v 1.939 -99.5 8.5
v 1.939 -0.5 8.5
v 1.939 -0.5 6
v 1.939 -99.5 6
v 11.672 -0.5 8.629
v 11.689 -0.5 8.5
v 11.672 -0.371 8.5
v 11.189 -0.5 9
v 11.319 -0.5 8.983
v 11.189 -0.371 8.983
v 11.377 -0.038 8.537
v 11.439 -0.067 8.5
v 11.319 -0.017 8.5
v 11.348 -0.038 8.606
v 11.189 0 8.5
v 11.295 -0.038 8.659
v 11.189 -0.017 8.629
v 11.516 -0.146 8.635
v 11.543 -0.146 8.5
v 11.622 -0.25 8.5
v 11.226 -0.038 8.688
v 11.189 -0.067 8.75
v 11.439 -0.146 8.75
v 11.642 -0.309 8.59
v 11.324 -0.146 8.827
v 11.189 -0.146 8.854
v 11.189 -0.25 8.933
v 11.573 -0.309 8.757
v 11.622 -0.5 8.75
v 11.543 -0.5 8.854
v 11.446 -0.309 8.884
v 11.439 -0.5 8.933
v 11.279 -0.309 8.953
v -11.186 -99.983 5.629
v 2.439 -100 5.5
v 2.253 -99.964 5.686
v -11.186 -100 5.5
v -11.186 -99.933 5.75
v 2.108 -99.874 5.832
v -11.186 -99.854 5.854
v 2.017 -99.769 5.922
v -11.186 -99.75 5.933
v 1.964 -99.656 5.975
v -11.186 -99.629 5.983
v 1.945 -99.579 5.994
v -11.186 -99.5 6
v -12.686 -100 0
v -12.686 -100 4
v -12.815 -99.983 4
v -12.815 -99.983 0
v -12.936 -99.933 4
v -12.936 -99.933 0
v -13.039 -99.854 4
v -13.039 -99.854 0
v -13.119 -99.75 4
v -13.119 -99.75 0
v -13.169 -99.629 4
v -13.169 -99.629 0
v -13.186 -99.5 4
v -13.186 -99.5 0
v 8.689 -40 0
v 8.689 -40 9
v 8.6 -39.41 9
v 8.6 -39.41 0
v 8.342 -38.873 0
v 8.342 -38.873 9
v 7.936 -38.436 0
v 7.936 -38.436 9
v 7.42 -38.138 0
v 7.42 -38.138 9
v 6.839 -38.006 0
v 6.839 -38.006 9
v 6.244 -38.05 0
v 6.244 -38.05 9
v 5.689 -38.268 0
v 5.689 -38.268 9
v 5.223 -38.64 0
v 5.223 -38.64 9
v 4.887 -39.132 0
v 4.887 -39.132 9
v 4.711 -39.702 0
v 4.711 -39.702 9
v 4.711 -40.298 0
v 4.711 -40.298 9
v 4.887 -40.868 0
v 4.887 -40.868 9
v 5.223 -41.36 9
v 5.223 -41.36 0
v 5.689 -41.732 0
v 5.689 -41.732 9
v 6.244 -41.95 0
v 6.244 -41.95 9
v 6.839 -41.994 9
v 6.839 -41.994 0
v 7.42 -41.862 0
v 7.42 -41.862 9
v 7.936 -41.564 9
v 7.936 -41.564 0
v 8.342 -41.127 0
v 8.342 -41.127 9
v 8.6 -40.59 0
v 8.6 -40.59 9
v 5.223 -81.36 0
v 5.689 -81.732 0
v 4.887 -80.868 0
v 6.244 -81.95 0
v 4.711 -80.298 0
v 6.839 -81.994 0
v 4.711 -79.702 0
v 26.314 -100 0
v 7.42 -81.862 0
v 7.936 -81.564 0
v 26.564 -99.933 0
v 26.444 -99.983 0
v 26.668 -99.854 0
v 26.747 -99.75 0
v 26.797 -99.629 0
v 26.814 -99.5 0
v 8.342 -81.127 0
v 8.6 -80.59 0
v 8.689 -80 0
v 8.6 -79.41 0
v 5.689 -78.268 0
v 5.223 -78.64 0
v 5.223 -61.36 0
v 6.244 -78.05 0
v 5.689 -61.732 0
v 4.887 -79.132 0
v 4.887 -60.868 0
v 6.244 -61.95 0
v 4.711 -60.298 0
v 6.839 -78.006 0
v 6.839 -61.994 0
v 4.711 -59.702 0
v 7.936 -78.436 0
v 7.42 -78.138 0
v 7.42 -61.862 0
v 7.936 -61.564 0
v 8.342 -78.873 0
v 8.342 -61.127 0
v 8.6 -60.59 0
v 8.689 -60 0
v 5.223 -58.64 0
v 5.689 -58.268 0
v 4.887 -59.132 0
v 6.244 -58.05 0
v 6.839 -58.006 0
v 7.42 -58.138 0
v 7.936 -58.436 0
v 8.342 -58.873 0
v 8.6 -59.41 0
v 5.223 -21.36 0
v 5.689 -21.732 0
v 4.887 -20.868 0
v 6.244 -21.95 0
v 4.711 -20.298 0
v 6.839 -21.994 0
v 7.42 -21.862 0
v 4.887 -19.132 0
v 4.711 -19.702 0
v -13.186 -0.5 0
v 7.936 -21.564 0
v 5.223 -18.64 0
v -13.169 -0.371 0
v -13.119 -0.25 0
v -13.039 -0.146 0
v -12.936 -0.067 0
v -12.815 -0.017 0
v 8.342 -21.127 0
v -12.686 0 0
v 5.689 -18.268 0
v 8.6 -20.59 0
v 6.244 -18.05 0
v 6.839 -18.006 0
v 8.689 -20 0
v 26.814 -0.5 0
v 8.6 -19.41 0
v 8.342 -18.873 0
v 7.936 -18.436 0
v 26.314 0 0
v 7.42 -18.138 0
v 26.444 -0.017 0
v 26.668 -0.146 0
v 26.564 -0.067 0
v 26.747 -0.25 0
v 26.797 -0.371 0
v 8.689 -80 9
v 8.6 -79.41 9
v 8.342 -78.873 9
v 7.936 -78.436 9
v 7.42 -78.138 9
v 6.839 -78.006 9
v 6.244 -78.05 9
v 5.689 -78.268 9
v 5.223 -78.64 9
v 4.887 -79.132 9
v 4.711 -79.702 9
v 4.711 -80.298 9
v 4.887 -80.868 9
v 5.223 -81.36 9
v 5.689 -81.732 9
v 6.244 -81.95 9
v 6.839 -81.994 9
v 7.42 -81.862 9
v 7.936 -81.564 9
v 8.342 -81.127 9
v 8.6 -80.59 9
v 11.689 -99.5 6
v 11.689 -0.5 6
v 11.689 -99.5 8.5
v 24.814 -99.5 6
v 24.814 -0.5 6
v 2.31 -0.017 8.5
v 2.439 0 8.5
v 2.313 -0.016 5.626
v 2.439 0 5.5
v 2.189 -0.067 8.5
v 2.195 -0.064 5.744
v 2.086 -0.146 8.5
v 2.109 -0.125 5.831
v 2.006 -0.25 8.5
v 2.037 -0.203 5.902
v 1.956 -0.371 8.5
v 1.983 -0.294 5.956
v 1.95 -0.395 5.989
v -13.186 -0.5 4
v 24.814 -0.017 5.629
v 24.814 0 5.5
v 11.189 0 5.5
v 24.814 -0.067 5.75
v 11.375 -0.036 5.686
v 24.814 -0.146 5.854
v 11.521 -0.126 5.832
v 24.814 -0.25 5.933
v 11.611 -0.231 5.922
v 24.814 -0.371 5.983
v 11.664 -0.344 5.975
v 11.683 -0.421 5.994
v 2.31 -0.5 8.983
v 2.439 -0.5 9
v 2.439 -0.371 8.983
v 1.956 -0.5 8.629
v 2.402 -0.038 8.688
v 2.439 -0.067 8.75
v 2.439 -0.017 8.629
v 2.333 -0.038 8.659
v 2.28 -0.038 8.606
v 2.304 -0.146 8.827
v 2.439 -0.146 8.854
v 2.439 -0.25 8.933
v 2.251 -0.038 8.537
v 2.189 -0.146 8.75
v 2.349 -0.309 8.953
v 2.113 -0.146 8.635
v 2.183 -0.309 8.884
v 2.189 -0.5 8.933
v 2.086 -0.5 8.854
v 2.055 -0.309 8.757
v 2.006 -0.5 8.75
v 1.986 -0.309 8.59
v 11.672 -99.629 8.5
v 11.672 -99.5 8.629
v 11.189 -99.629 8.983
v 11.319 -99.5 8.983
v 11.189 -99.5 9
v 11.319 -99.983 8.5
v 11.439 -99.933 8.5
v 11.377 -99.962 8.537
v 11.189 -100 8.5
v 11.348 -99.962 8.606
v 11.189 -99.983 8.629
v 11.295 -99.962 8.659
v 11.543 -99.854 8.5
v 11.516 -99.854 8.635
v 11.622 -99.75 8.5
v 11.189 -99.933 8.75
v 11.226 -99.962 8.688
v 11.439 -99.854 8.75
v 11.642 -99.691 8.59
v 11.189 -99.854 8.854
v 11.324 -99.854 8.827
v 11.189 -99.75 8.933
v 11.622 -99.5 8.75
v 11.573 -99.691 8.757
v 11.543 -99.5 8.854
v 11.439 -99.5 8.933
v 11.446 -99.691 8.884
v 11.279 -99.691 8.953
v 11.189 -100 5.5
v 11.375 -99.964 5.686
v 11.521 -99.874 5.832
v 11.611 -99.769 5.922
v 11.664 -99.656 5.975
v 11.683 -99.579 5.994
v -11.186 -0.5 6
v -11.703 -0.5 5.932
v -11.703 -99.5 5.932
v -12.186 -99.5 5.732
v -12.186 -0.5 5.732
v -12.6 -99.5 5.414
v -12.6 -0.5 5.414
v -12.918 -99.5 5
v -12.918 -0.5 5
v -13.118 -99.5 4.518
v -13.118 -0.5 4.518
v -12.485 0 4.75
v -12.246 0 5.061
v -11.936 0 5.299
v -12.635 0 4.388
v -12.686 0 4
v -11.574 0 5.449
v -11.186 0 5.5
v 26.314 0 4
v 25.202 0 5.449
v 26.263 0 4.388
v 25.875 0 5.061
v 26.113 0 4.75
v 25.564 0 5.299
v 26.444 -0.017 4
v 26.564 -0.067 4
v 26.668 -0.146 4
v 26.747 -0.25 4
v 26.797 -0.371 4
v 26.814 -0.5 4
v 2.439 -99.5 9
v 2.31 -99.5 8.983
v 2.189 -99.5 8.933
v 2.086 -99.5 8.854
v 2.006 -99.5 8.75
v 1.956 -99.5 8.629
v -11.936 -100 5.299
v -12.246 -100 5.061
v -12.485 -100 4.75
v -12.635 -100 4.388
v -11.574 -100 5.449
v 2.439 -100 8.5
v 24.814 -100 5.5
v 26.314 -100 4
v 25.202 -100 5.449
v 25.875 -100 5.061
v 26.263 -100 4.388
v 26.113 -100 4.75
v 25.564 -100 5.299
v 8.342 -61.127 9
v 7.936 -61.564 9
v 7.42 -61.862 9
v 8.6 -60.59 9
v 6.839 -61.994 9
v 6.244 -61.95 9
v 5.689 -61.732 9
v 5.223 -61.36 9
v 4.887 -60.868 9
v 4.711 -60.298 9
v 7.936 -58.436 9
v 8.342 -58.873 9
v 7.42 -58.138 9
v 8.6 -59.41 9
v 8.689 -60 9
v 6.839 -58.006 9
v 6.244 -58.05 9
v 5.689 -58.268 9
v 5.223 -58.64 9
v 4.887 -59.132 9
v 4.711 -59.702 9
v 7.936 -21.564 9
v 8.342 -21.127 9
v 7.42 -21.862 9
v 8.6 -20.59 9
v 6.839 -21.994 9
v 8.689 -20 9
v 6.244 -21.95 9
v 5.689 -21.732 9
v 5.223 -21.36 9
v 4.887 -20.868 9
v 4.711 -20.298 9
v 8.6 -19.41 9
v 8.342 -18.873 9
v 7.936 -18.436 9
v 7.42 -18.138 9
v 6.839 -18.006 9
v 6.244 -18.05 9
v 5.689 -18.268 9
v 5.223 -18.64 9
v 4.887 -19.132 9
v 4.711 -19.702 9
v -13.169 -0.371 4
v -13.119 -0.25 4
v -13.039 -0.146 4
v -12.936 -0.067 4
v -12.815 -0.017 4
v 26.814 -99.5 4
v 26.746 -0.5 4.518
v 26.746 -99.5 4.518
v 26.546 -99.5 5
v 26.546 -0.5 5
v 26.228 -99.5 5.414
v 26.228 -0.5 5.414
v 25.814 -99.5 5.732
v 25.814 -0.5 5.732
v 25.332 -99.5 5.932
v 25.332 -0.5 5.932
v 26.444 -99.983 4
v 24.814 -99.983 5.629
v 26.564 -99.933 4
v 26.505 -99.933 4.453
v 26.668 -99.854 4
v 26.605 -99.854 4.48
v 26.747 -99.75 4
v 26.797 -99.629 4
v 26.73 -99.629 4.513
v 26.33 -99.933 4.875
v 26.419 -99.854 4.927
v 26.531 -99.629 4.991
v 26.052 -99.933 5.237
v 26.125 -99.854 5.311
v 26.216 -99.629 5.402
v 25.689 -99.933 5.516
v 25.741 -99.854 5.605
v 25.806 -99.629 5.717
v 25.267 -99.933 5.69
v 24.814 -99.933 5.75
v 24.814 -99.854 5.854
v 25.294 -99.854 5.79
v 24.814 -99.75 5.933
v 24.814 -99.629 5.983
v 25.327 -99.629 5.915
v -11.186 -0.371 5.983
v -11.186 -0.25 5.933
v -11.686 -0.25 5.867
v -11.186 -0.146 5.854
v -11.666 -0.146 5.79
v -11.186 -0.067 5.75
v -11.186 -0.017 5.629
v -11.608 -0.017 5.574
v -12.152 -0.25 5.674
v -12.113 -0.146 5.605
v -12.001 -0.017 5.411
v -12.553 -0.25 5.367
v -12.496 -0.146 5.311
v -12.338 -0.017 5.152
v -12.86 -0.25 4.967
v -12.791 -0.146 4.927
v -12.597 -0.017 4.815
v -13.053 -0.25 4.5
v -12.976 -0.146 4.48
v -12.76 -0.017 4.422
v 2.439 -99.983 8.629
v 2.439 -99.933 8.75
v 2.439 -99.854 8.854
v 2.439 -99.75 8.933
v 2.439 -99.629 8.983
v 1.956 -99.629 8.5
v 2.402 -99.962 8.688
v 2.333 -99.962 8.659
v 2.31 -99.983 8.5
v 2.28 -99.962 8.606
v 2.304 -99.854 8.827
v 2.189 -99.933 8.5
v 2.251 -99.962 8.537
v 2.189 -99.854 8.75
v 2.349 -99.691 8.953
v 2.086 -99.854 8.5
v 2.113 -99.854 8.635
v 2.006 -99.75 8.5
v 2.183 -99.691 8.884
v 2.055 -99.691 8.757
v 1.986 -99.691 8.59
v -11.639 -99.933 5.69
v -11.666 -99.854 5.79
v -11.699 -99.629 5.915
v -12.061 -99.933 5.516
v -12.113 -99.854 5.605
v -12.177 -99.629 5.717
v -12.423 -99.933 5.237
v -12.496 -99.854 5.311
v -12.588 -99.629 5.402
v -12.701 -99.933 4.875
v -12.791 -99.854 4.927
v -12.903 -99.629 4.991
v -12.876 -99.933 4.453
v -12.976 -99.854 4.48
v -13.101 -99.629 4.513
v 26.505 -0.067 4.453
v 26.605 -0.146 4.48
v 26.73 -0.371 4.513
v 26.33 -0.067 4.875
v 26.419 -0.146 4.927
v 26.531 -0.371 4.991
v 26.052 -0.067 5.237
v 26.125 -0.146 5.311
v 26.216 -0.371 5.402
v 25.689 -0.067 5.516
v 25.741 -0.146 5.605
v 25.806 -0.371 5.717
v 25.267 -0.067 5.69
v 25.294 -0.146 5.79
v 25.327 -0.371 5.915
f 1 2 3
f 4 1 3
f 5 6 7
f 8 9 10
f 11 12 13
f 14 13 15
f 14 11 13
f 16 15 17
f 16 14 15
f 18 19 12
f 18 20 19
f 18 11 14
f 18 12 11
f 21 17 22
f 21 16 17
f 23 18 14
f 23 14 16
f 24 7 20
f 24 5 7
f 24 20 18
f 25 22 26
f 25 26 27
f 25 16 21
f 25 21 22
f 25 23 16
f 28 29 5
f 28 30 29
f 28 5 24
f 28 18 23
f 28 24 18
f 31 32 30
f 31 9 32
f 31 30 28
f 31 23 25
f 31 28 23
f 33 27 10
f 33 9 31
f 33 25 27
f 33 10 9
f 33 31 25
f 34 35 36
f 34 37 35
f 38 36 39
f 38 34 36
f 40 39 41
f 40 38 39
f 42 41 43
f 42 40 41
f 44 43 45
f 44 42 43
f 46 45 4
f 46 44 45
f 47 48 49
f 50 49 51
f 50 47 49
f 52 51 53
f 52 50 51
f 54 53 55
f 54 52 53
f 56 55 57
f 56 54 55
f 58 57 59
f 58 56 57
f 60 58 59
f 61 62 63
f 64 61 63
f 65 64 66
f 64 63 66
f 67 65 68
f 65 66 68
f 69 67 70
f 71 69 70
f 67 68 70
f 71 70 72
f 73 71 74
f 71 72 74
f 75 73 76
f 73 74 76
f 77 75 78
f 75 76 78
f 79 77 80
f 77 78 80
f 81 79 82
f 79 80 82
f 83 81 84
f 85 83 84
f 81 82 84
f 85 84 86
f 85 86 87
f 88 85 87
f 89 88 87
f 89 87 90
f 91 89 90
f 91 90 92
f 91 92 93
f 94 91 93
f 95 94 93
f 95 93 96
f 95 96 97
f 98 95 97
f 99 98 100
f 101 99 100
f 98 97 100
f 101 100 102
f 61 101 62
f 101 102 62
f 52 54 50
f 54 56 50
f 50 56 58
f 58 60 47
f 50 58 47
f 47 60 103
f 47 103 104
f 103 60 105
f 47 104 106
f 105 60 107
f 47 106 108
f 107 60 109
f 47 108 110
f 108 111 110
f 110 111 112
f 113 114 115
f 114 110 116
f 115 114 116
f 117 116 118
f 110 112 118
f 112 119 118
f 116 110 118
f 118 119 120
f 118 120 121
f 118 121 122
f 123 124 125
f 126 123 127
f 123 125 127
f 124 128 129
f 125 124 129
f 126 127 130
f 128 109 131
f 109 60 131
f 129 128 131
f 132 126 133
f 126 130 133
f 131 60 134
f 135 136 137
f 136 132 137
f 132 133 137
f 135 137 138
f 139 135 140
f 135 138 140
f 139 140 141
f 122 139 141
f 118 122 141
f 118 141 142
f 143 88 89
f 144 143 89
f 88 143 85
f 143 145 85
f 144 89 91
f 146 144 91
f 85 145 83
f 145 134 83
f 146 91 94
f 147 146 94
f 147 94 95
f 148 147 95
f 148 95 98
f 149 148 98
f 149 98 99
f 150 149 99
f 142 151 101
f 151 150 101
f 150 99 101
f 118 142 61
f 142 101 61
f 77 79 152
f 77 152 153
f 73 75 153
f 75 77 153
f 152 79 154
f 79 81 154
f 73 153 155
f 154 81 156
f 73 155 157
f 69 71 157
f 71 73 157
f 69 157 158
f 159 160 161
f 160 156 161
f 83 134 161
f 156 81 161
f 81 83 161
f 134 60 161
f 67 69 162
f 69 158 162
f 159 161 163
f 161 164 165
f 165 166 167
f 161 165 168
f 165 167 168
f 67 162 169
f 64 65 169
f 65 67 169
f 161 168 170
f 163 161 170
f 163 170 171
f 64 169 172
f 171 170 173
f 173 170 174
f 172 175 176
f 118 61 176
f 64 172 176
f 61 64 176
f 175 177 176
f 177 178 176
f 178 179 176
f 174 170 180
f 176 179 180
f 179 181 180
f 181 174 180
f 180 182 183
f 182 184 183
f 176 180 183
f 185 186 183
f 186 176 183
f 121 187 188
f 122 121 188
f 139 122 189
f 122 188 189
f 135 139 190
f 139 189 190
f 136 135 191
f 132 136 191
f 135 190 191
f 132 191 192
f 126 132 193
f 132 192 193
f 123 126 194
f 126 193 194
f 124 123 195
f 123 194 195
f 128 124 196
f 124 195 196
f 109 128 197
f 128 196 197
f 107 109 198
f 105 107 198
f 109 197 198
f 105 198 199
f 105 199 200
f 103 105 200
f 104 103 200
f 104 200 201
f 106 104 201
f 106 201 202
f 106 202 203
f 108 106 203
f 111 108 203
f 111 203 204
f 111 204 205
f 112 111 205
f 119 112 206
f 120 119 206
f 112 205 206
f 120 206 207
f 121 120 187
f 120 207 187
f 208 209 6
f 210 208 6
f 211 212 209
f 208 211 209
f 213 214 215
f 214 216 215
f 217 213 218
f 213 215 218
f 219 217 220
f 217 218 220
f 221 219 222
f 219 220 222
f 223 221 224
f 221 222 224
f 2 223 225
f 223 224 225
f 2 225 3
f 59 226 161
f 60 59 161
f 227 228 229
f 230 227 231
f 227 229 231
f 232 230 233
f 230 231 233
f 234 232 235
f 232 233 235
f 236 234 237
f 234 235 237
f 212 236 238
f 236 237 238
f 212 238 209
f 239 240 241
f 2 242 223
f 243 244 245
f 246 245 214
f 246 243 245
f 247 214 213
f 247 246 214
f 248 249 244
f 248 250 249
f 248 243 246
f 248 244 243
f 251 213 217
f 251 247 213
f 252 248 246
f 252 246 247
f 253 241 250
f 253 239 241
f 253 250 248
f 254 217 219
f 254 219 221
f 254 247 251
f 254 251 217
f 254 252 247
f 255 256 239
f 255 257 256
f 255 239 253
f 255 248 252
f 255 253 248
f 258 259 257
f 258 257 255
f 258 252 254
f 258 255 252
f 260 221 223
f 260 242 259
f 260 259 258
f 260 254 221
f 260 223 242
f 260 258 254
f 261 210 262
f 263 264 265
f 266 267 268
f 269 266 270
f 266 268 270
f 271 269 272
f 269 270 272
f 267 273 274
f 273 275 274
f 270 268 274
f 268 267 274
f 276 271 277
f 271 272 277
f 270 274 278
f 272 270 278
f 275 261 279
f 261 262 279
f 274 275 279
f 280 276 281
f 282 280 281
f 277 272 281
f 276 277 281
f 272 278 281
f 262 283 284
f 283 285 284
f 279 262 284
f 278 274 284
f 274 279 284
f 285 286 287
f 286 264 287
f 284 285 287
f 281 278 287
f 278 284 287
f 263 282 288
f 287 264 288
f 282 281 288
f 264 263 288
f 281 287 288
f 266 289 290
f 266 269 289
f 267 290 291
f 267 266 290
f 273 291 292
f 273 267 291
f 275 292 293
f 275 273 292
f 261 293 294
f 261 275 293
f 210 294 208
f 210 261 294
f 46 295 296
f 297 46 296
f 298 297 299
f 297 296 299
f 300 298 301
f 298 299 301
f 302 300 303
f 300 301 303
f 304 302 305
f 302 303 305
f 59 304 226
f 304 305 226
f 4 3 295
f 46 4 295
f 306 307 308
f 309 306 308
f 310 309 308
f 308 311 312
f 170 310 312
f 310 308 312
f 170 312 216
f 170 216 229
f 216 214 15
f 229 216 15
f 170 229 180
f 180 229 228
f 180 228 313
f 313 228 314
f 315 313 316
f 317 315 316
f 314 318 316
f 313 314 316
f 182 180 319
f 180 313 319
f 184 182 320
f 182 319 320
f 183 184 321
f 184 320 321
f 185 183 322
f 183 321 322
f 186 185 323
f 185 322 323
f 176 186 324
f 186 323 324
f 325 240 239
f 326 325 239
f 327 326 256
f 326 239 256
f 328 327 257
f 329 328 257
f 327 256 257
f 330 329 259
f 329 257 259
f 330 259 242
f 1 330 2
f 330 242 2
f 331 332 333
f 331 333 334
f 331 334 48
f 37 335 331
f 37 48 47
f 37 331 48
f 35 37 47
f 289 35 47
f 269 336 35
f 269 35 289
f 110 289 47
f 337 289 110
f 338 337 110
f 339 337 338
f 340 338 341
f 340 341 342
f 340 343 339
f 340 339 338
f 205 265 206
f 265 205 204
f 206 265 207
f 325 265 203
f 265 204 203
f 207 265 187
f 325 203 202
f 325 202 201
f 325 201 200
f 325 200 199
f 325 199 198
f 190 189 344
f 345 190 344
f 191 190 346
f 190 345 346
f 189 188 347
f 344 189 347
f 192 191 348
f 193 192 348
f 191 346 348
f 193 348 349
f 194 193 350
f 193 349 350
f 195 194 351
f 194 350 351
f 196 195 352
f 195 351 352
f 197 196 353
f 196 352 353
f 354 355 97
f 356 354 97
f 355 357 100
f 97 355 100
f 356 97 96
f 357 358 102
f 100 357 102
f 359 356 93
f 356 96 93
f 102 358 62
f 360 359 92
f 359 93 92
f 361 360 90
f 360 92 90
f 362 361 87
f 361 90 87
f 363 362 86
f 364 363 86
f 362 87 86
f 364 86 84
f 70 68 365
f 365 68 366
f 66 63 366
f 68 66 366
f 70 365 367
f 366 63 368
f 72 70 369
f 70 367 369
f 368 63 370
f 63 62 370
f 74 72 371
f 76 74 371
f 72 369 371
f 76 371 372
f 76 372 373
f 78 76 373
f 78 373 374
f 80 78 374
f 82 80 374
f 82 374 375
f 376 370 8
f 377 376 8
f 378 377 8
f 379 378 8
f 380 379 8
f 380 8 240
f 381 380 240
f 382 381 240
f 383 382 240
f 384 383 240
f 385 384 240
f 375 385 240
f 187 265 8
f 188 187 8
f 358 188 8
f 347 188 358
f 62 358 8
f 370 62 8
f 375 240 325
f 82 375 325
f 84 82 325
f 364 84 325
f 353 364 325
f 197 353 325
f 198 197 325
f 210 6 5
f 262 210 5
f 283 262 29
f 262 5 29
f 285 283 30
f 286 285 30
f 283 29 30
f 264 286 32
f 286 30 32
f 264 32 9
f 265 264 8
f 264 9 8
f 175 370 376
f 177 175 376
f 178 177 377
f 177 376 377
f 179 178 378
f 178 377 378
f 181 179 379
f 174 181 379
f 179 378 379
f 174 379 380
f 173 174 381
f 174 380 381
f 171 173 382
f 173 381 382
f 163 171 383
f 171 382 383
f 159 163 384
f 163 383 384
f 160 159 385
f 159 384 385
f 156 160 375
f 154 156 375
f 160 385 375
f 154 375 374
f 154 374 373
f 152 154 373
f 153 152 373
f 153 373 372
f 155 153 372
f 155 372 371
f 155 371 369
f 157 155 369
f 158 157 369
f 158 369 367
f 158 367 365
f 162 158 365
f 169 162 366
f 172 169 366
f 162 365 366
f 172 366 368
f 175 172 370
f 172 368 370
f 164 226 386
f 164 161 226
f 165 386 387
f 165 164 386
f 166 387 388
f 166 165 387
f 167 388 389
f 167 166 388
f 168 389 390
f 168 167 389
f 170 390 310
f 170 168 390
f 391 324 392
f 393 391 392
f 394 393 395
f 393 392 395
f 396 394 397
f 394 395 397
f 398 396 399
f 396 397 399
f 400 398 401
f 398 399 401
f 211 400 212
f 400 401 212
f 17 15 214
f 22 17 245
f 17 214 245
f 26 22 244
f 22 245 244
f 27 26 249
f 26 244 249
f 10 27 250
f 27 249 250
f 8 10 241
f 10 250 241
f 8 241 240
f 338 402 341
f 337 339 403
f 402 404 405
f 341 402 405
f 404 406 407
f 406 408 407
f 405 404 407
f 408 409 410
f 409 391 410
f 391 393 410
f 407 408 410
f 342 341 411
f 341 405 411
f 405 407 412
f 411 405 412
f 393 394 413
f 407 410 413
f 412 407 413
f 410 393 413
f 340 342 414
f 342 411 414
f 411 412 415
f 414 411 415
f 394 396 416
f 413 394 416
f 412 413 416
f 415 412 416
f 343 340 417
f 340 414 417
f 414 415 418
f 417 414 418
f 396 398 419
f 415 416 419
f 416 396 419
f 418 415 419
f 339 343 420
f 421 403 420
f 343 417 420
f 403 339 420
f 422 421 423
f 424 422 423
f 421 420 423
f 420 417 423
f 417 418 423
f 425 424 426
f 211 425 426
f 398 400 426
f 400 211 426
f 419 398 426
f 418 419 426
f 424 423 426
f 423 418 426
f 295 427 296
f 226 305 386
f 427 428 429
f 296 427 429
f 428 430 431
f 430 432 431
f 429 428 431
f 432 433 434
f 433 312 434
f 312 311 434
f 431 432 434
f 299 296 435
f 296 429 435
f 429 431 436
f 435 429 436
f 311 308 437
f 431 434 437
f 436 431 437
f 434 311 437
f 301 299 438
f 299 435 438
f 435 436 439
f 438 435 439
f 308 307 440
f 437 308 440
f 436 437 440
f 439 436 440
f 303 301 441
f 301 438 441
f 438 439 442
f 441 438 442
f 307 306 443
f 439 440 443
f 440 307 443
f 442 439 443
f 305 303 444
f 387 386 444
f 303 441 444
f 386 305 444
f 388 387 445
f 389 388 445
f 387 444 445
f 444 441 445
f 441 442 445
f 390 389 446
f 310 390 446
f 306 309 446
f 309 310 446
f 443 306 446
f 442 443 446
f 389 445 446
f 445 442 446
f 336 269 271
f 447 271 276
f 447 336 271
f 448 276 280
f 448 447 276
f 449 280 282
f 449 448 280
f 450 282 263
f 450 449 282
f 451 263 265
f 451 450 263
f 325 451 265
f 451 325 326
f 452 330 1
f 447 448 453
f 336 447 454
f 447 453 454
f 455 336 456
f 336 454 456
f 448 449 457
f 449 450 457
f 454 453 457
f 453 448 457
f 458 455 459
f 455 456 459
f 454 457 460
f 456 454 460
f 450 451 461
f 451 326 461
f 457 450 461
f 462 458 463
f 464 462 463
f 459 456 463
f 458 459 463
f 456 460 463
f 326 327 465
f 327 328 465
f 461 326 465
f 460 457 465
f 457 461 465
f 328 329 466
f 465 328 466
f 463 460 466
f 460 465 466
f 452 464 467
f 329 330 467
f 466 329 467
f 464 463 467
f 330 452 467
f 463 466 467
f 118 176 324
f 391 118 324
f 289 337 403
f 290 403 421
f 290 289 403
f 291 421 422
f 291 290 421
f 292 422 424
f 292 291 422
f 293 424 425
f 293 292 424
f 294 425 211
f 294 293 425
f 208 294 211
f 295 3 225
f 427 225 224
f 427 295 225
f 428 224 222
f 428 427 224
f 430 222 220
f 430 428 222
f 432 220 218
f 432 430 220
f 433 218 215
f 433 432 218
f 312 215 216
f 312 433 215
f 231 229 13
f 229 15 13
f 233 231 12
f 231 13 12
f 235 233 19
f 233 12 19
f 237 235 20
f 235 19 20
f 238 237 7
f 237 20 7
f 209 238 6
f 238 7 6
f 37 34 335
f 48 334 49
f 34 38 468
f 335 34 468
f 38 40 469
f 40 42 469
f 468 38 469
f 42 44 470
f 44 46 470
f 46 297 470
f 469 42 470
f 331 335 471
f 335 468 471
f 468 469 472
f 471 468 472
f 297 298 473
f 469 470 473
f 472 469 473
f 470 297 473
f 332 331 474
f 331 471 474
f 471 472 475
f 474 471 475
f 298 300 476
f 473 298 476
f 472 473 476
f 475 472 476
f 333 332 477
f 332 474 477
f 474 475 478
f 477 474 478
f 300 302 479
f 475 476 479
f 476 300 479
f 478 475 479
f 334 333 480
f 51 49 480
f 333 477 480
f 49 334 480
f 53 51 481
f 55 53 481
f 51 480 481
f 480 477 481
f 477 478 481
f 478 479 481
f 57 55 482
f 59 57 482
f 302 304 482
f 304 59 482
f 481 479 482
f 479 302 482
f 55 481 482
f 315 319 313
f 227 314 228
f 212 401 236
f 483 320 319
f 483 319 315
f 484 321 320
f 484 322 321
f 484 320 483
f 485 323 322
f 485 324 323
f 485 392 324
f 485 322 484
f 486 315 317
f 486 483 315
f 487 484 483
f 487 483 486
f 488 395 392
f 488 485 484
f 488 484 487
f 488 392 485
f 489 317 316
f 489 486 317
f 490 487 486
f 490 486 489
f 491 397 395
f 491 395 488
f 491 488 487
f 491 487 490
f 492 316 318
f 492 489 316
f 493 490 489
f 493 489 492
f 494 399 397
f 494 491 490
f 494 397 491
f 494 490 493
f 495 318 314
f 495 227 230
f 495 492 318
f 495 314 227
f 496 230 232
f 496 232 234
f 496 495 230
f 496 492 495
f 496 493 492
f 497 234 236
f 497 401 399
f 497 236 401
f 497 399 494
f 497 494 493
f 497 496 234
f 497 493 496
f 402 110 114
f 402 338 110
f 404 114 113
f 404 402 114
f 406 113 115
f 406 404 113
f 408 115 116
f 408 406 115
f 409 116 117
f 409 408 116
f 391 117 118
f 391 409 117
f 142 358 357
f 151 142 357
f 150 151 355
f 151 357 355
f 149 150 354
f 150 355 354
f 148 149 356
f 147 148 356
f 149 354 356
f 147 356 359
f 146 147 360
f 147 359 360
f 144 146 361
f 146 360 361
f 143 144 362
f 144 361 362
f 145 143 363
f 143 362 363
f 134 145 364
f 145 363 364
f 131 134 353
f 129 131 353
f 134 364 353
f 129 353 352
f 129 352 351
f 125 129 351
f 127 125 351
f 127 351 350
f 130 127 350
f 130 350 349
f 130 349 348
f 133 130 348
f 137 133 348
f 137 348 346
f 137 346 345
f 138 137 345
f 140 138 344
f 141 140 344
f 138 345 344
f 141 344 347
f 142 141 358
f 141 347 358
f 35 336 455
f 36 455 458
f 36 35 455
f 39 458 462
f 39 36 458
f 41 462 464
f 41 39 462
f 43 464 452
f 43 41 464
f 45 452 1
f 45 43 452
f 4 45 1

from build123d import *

# Parameters (mm, degrees)
F1_DEPTH = 100
F2_R     = 2
F3_DEPTH = 9
F4_R     = 0.5


with BuildPart() as f1:
    # F0 (on Front) → F1 (new body)
    with BuildSketch(Plane.XZ):
        with BuildLine():
            Line((-13.1858391894, 0), (26.8141608106, 0))
            Line((26.8141608106, 0), (26.8141608106, 4))
            ThreePointArc((26.8141608106, 4), (26.228374373, 5.4142135624), (24.8141608106, 6))
            Line((24.8141608106, 6), (11.6891608106, 6))
            Line((11.6891608106, 6), (11.6891608106, 8.5))
            ThreePointArc((11.6891608106, 8.5), (11.5427142012, 8.8535533906), (11.1891608106, 9))
            Line((11.1891608106, 9), (2.4391608106, 9))
            ThreePointArc((2.4391608106, 9), (2.08560742, 8.8535533906), (1.9391608106, 8.5))
            Line((1.9391608106, 8.5), (1.9391608106, 6))
            Line((1.9391608106, 6), (-11.1858391894, 6))
            ThreePointArc((-11.1858391894, 6), (-12.6000527518, 5.4142135624), (-13.1858391894, 4))
            Line((-13.1858391894, 4), (-13.1858391894, 0))
        make_face()
    extrude(amount=F1_DEPTH)

    # F2 (on face) → F3 (cut, through all)
    with BuildSketch(Plane.XY.offset(9)):
        with Locations((6.6891608106, -80)):
            Circle(F2_R)
        with Locations((6.6891608106, -60)):
            Circle(F2_R)
        with Locations((6.6891608106, -40)):
            Circle(F2_R)
        with Locations((6.6891608106, -20)):
            Circle(F2_R)
    extrude(amount=-F3_DEPTH, mode=Mode.SUBTRACT)

    # F4
    f4_edges = [f1.edges().sort_by_distance(p)[0] for p in [
        (18.251661, -100, 6),
        (6.814161, -100, 9),
        (-4.623339, -100, 6),
        (11.689161, -100, 7.25),
        (11.542714, -100, 8.853553),
        (2.085607, -100, 8.853553),
        (1.939161, -100, 7.25),
        (-13.185839, -100, 2),
        (-12.600053, -100, 5.414214),
        (26.228374, -100, 5.414214),
        (26.814161, -100, 2),
        (-13.185839, 0, 2),
        (-12.600053, 0, 5.414214),
        (1.939161, 0, 7.25),
        (2.085607, 0, 8.853553),
        (6.814161, 0, 9),
        (18.251661, 0, 6),
        (26.228374, 0, 5.414214),
    ]]
    fillet(f4_edges, radius=F4_R)


solid = f1.part
